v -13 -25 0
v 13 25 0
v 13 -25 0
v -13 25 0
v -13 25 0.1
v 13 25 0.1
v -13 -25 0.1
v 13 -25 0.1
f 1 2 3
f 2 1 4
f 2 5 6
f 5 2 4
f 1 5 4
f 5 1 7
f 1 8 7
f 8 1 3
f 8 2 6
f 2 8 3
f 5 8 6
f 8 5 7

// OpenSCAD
// file: ../p/4-4edge.scad
use <../lib.scad>
$fa=1; $fs=0.2;
function ldraw_lib__4_4edge(realsolid=false) = [
// 0 Circle 1.0
// 0 Name: 4-4edge.dat
// 0 Author: James Jessiman
// 0 !LDRAW_ORG Primitive UPDATE 2017-01
// 0 !LICENSE Licensed under CC BY 2.0 and CC BY 4.0 : see CAreadme.txt
// 
// 0 BFC CERTIFY CCW
  [0,"BFC","CERTIFY"],
  [0,"BFC","CCW"],
// 
// 0 !HISTORY 1998-12-15 [PTadmin] Official Update 1998-10
// 0 !HISTORY 2005-12-28 [PTadmin] Official Update 2005-01
// 0 !HISTORY 2007-06-24 [PTadmin] Header formatted for Contributor Agreement
// 0 !HISTORY 2008-07-01 [PTadmin] Official Update 2008-01
// 0 !HISTORY 2017-01-15 [Steffen] BFCed
// 0 !HISTORY 2017-12-30 [PTadmin] Official Update 2017-01
// 
// 
// 2 24 1 0 0 0.9239 0 0.3827
  [2,24,1,0,0,0.9239,0,0.3827],
// 2 24 0.9239 0 0.3827 0.7071 0 0.7071
  [2,24,0.9239,0,0.3827,0.7071,0,0.7071],
// 2 24 0.7071 0 0.7071 0.3827 0 0.9239
  [2,24,0.7071,0,0.7071,0.3827,0,0.9239],
// 2 24 0.3827 0 0.9239 0 0 1
  [2,24,0.3827,0,0.9239,0,0,1],
// 2 24 0 0 1 -0.3827 0 0.9239
  [2,24,0,0,1,-0.3827,0,0.9239],
// 2 24 -0.3827 0 0.9239 -0.7071 0 0.7071
  [2,24,-0.3827,0,0.9239,-0.7071,0,0.7071],
// 2 24 -0.7071 0 0.7071 -0.9239 0 0.3827
  [2,24,-0.7071,0,0.7071,-0.9239,0,0.3827],
// 2 24 -0.9239 0 0.3827 -1 0 -0
  [2,24,-0.9239,0,0.3827,-1,0,-0],
// 2 24 -1 0 -0 -0.9239 0 -0.3827
  [2,24,-1,0,-0,-0.9239,0,-0.3827],
// 2 24 -0.9239 0 -0.3827 -0.7071 0 -0.7071
  [2,24,-0.9239,0,-0.3827,-0.7071,0,-0.7071],
// 2 24 -0.7071 0 -0.7071 -0.3827 0 -0.9239
  [2,24,-0.7071,0,-0.7071,-0.3827,0,-0.9239],
// 2 24 -0.3827 0 -0.9239 0 0 -1
  [2,24,-0.3827,0,-0.9239,0,0,-1],
// 2 24 0 0 -1 0.3827 0 -0.9239
  [2,24,0,0,-1,0.3827,0,-0.9239],
// 2 24 0.3827 0 -0.9239 0.7071 0 -0.7071
  [2,24,0.3827,0,-0.9239,0.7071,0,-0.7071],
// 2 24 0.7071 0 -0.7071 0.9239 0 -0.3827
  [2,24,0.7071,0,-0.7071,0.9239,0,-0.3827],
// 2 24 0.9239 0 -0.3827 1 0 0
  [2,24,0.9239,0,-0.3827,1,0,0],
];
module ldraw_lib__4_4edge(step=0, col=false, unit=2/5, alt=false, line=0.2, solid=!$preview)
    makepoly(ldraw_lib__4_4edge(solid), step=step, col=col, unit=unit, alt=alt, line=line, solid=solid);
ldraw_lib__4_4edge(line=0.2);
// file: ../p/4-4disc.scad
use <../lib.scad>
$fa=1; $fs=0.2;
function ldraw_lib__4_4disc(realsolid=false) = [
// 0 Disc 1.0
// 0 Name: 4-4disc.dat
// 0 Author: James Jessiman
// 0 !LDRAW_ORG Primitive UPDATE 2002-02
// 0 !LICENSE Licensed under CC BY 2.0 and CC BY 4.0 : see CAreadme.txt
// 
// 0 BFC CERTIFY CCW
  [0,"BFC","CERTIFY"],
  [0,"BFC","CCW"],
// 
// 0 !HISTORY 1998-12-15 [PTadmin] Official Update 1998-10
// 0 !HISTORY 2002-03-23 [sbliss] Added BFC statement
// 0 !HISTORY 2002-04-25 [PTadmin] Official Update 2002-02
// 0 !HISTORY 2007-06-24 [PTadmin] Header formatted for Contributor Agreement
// 0 !HISTORY 2008-07-01 [PTadmin] Official Update 2008-01
// 
// 
// 3 16 0 0 0 1 0 0 0.9239 0 0.3827
  [3,16,0,0,0,1,0,0,0.9239,0,0.3827],
// 3 16 0 0 0 0.9239 0 0.3827 0.7071 0 0.7071
  [3,16,0,0,0,0.9239,0,0.3827,0.7071,0,0.7071],
// 3 16 0 0 0 0.7071 0 0.7071 0.3827 0 0.9239
  [3,16,0,0,0,0.7071,0,0.7071,0.3827,0,0.9239],
// 3 16 0 0 0 0.3827 0 0.9239 0 0 1
  [3,16,0,0,0,0.3827,0,0.9239,0,0,1],
// 3 16 0 0 0 0 0 1 -0.3827 0 0.9239
  [3,16,0,0,0,0,0,1,-0.3827,0,0.9239],
// 3 16 0 0 0 -0.3827 0 0.9239 -0.7071 0 0.7071
  [3,16,0,0,0,-0.3827,0,0.9239,-0.7071,0,0.7071],
// 3 16 0 0 0 -0.7071 0 0.7071 -0.9239 0 0.3827
  [3,16,0,0,0,-0.7071,0,0.7071,-0.9239,0,0.3827],
// 3 16 0 0 0 -0.9239 0 0.3827 -1 0 -0
  [3,16,0,0,0,-0.9239,0,0.3827,-1,0,-0],
// 3 16 0 0 0 -1 0 -0 -0.9239 0 -0.3827
  [3,16,0,0,0,-1,0,-0,-0.9239,0,-0.3827],
// 3 16 0 0 0 -0.9239 0 -0.3827 -0.7071 0 -0.7071
  [3,16,0,0,0,-0.9239,0,-0.3827,-0.7071,0,-0.7071],
// 3 16 0 0 0 -0.7071 0 -0.7071 -0.3827 0 -0.9239
  [3,16,0,0,0,-0.7071,0,-0.7071,-0.3827,0,-0.9239],
// 3 16 0 0 0 -0.3827 0 -0.9239 0 0 -1
  [3,16,0,0,0,-0.3827,0,-0.9239,0,0,-1],
// 3 16 0 0 0 0 0 -1 0.3827 0 -0.9239
  [3,16,0,0,0,0,0,-1,0.3827,0,-0.9239],
// 3 16 0 0 0 0.3827 0 -0.9239 0.7071 0 -0.7071
  [3,16,0,0,0,0.3827,0,-0.9239,0.7071,0,-0.7071],
// 3 16 0 0 0 0.7071 0 -0.7071 0.9239 0 -0.3827
  [3,16,0,0,0,0.7071,0,-0.7071,0.9239,0,-0.3827],
// 3 16 0 0 0 0.9239 0 -0.3827 1 0 0
  [3,16,0,0,0,0.9239,0,-0.3827,1,0,0],
// 0
];
module ldraw_lib__4_4disc(step=0, col=false, unit=2/5, alt=false, line=0.2, solid=!$preview)
    makepoly(ldraw_lib__4_4disc(solid), step=step, col=col, unit=unit, alt=alt, line=line, solid=solid);
ldraw_lib__4_4disc(line=0.2);
// file: ../p/4-4cyli.scad
use <../lib.scad>
$fa=1; $fs=0.2;
function ldraw_lib__4_4cyli(realsolid=false) = [
// 0 Cylinder 1.0
// 0 Name: 4-4cyli.dat
// 0 Author: James Jessiman
// 0 !LDRAW_ORG Primitive UPDATE 2005-01
// 0 !LICENSE Licensed under CC BY 2.0 and CC BY 4.0 : see CAreadme.txt
// 
// 0 BFC CERTIFY CCW
  [0,"BFC","CERTIFY"],
  [0,"BFC","CCW"],
// 
// 0 !HISTORY 1998-12-15 [PTadmin] Official Update 1998-10
// 0 !HISTORY 2002-03-23 [sbliss] Added BFC statement; merged headers from files in distributions LDraw 0.27 and Complete.
// 0 !HISTORY 2002-04-25 [PTadmin] Official Update 2002-02
// 0 !HISTORY 2004-12-14 [guyvivan] BFC CCW
// 0 !HISTORY 2005-12-28 [PTadmin] Official Update 2005-01
// 0 !HISTORY 2007-06-24 [PTadmin] Header formatted for Contributor Agreement
// 0 !HISTORY 2008-07-01 [PTadmin] Official Update 2008-01
// 
// 
// 4 16 1 1 0 0.9239 1 0.3827 0.9239 0 0.3827 1 0 0
  [4,16,1,1,0,0.9239,1,0.3827,0.9239,0,0.3827,1,0,0],
// 5 24 1 0 0 1 1 0 0.9239 0 0.3827 0.9239 0 -0.3827
  [5,24,1,0,0,1,1,0,0.9239,0,0.3827,0.9239,0,-0.3827],
// 4 16 0.9239 1 0.3827 0.7071 1 0.7071 0.7071 0 0.7071 0.9239 0 0.3827
  [4,16,0.9239,1,0.3827,0.7071,1,0.7071,0.7071,0,0.7071,0.9239,0,0.3827],
// 5 24 0.9239 0 0.3827 0.9239 1 0.3827 0.7071 0 0.7071 1 0 0
  [5,24,0.9239,0,0.3827,0.9239,1,0.3827,0.7071,0,0.7071,1,0,0],
// 4 16 0.7071 1 0.7071 0.3827 1 0.9239 0.3827 0 0.9239 0.7071 0 0.7071
  [4,16,0.7071,1,0.7071,0.3827,1,0.9239,0.3827,0,0.9239,0.7071,0,0.7071],
// 5 24 0.7071 0 0.7071 0.7071 1 0.7071 0.3827 0 0.9239 0.9239 0 0.3827
  [5,24,0.7071,0,0.7071,0.7071,1,0.7071,0.3827,0,0.9239,0.9239,0,0.3827],
// 4 16 0.3827 1 0.9239 0 1 1 0 0 1 0.3827 0 0.9239
  [4,16,0.3827,1,0.9239,0,1,1,0,0,1,0.3827,0,0.9239],
// 5 24 0.3827 0 0.9239 0.3827 1 0.9239 0 0 1 0.7071 0 0.7071
  [5,24,0.3827,0,0.9239,0.3827,1,0.9239,0,0,1,0.7071,0,0.7071],
// 4 16 0 1 1 -0.3827 1 0.9239 -0.3827 0 0.9239 0 0 1
  [4,16,0,1,1,-0.3827,1,0.9239,-0.3827,0,0.9239,0,0,1],
// 5 24 0 0 1 0 1 1 -0.3827 0 0.9239 0.3827 0 0.9239
  [5,24,0,0,1,0,1,1,-0.3827,0,0.9239,0.3827,0,0.9239],
// 4 16 -0.3827 1 0.9239 -0.7071 1 0.7071 -0.7071 0 0.7071 -0.3827 0 0.9239
  [4,16,-0.3827,1,0.9239,-0.7071,1,0.7071,-0.7071,0,0.7071,-0.3827,0,0.9239],
// 5 24 -0.3827 0 0.9239 -0.3827 1 0.9239 -0.7071 0 0.7071 0 0 1
  [5,24,-0.3827,0,0.9239,-0.3827,1,0.9239,-0.7071,0,0.7071,0,0,1],
// 4 16 -0.7071 1 0.7071 -0.9239 1 0.3827 -0.9239 0 0.3827 -0.7071 0 0.7071
  [4,16,-0.7071,1,0.7071,-0.9239,1,0.3827,-0.9239,0,0.3827,-0.7071,0,0.7071],
// 5 24 -0.7071 0 0.7071 -0.7071 1 0.7071 -0.9239 0 0.3827 -0.3827 0 0.9239
  [5,24,-0.7071,0,0.7071,-0.7071,1,0.7071,-0.9239,0,0.3827,-0.3827,0,0.9239],
// 4 16 -0.9239 1 0.3827 -1 1 0 -1 0 0 -0.9239 0 0.3827
  [4,16,-0.9239,1,0.3827,-1,1,0,-1,0,0,-0.9239,0,0.3827],
// 5 24 -0.9239 0 0.3827 -0.9239 1 0.3827 -1 0 0 -0.7071 0 0.7071
  [5,24,-0.9239,0,0.3827,-0.9239,1,0.3827,-1,0,0,-0.7071,0,0.7071],
// 4 16 -1 1 0 -0.9239 1 -0.3827 -0.9239 0 -0.3827 -1 0 0
  [4,16,-1,1,0,-0.9239,1,-0.3827,-0.9239,0,-0.3827,-1,0,0],
// 5 24 -1 0 0 -1 1 0 -0.9239 0 -0.3827 -0.9239 0 0.3827
  [5,24,-1,0,0,-1,1,0,-0.9239,0,-0.3827,-0.9239,0,0.3827],
// 4 16 -0.9239 1 -0.3827 -0.7071 1 -0.7071 -0.7071 0 -0.7071 -0.9239 0 -0.3827
  [4,16,-0.9239,1,-0.3827,-0.7071,1,-0.7071,-0.7071,0,-0.7071,-0.9239,0,-0.3827],
// 5 24 -0.9239 0 -0.3827 -0.9239 1 -0.3827 -0.7071 0 -0.7071 -1 0 0
  [5,24,-0.9239,0,-0.3827,-0.9239,1,-0.3827,-0.7071,0,-0.7071,-1,0,0],
// 4 16 -0.7071 1 -0.7071 -0.3827 1 -0.9239 -0.3827 0 -0.9239 -0.7071 0 -0.7071
  [4,16,-0.7071,1,-0.7071,-0.3827,1,-0.9239,-0.3827,0,-0.9239,-0.7071,0,-0.7071],
// 5 24 -0.7071 0 -0.7071 -0.7071 1 -0.7071 -0.3827 0 -0.9239 -0.9239 0 -0.3827
  [5,24,-0.7071,0,-0.7071,-0.7071,1,-0.7071,-0.3827,0,-0.9239,-0.9239,0,-0.3827],
// 4 16 -0.3827 1 -0.9239 0 1 -1 0 0 -1 -0.3827 0 -0.9239
  [4,16,-0.3827,1,-0.9239,0,1,-1,0,0,-1,-0.3827,0,-0.9239],
// 5 24 -0.3827 0 -0.9239 -0.3827 1 -0.9239 0 0 -1 -0.7071 0 -0.7071
  [5,24,-0.3827,0,-0.9239,-0.3827,1,-0.9239,0,0,-1,-0.7071,0,-0.7071],
// 4 16 0 1 -1 0.3827 1 -0.9239 0.3827 0 -0.9239 0 0 -1
  [4,16,0,1,-1,0.3827,1,-0.9239,0.3827,0,-0.9239,0,0,-1],
// 5 24 0 0 -1 0 1 -1 0.3827 0 -0.9239 -0.3827 0 -0.9239
  [5,24,0,0,-1,0,1,-1,0.3827,0,-0.9239,-0.3827,0,-0.9239],
// 4 16 0.3827 1 -0.9239 0.7071 1 -0.7071 0.7071 0 -0.7071 0.3827 0 -0.9239
  [4,16,0.3827,1,-0.9239,0.7071,1,-0.7071,0.7071,0,-0.7071,0.3827,0,-0.9239],
// 5 24 0.3827 0 -0.9239 0.3827 1 -0.9239 0.7071 0 -0.7071 0 0 -1
  [5,24,0.3827,0,-0.9239,0.3827,1,-0.9239,0.7071,0,-0.7071,0,0,-1],
// 4 16 0.7071 1 -0.7071 0.9239 1 -0.3827 0.9239 0 -0.3827 0.7071 0 -0.7071
  [4,16,0.7071,1,-0.7071,0.9239,1,-0.3827,0.9239,0,-0.3827,0.7071,0,-0.7071],
// 5 24 0.7071 0 -0.7071 0.7071 1 -0.7071 0.9239 0 -0.3827 0.3827 0 -0.9239
  [5,24,0.7071,0,-0.7071,0.7071,1,-0.7071,0.9239,0,-0.3827,0.3827,0,-0.9239],
// 4 16 0.9239 1 -0.3827 1 1 0 1 0 0 0.9239 0 -0.3827
  [4,16,0.9239,1,-0.3827,1,1,0,1,0,0,0.9239,0,-0.3827],
// 5 24 0.9239 0 -0.3827 0.9239 1 -0.3827 1 0 0 0.7071 0 -0.7071
  [5,24,0.9239,0,-0.3827,0.9239,1,-0.3827,1,0,0,0.7071,0,-0.7071],
// 0
];
module ldraw_lib__4_4cyli(step=0, col=false, unit=2/5, alt=false, line=0.2, solid=!$preview)
    makepoly(ldraw_lib__4_4cyli(solid), step=step, col=col, unit=unit, alt=alt, line=line, solid=solid);
ldraw_lib__4_4cyli(line=0.2);
// file: ../p/stud3.scad
use <../lib.scad>
use <4-4cyli.scad>
use <4-4disc.scad>
use <4-4edge.scad>
$fa=1; $fs=0.2;
function ldraw_lib__stud3(realsolid=false) = realsolid ? 
    [openscad(translate([0,0,-eps()], o=cylinder(4+eps(), r=4)),2)] : [
// 0 Stud Tube Solid
// 0 Name: stud3.dat
// 0 Author: James Jessiman
// 0 !LDRAW_ORG Primitive UPDATE 2012-01
// 0 !LICENSE Licensed under CC BY 2.0 and CC BY 4.0 : see CAreadme.txt
// 
// 0 BFC CERTIFY CCW
  [0,"BFC","CERTIFY"],
  [0,"BFC","CCW"],
// 
// 0 !HISTORY 2002-04-04 [sbliss] Modified for BFC compliance
// 0 !HISTORY 2002-04-25 [PTadmin] Official Update 2002-02
// 0 !HISTORY 2007-06-24 [PTadmin] Header formatted for Contributor Agreement
// 0 !HISTORY 2008-07-01 [PTadmin] Official Update 2008-01
// 0 !HISTORY 2012-02-16 [Philo] Changed to CCW
// 0 !HISTORY 2012-03-30 [PTadmin] Official Update 2012-01
// 
// 
// 1 16 0 -4 0 4 0 0 0 1 0 0 0 4 4-4edge.dat
  [1,16,0,-4,0,4,0,0,0,1,0,0,0,4, ldraw_lib__4_4edge(realsolid)],
// 1 16 0 0 0 4 0 0 0 1 0 0 0 4 4-4edge.dat
  [1,16,0,0,0,4,0,0,0,1,0,0,0,4, ldraw_lib__4_4edge(realsolid)],
// 1 16 0 -4 0 4 0 0 0 1 0 0 0 4 4-4disc.dat
  [1,16,0,-4,0,4,0,0,0,1,0,0,0,4, ldraw_lib__4_4disc(realsolid)],
// 1 16 0 -4 0 4 0 0 0 4 0 0 0 4 4-4cyli.dat
  [1,16,0,-4,0,4,0,0,0,4,0,0,0,4, ldraw_lib__4_4cyli(realsolid)],
];
module ldraw_lib__stud3(step=0, col=false, unit=2/5, alt=false, line=0.2, solid=!$preview)
    makepoly(ldraw_lib__stud3(solid), step=step, col=col, unit=unit, alt=alt, line=line, solid=solid);
ldraw_lib__stud3(line=0.2);
// file: ../p/stud.scad
use <../lib.scad>
use <4-4cyli.scad>
use <4-4disc.scad>
use <4-4edge.scad>
$fa=1; $fs=0.2;
function ldraw_lib__stud(realsolid=false) = realsolid ? 
    [openscad(translate([0,0,-eps()], o=cylinder(4+eps(), r=6)),2)] : [
// 0 Stud
// 0 Name: stud.dat
// 0 Author: James Jessiman
// 0 !LDRAW_ORG Primitive UPDATE 2012-01
// 0 !LICENSE Licensed under CC BY 2.0 and CC BY 4.0 : see CAreadme.txt
// 
// 0 BFC CERTIFY CCW
  [0,"BFC","CERTIFY"],
  [0,"BFC","CCW"],
// 
// 0 !HISTORY 2002-04-04 [sbliss] Modified for BFC compliance
// 0 !HISTORY 2002-04-25 [PTadmin] Official Update 2002-02
// 0 !HISTORY 2007-06-24 [PTadmin] Header formatted for Contributor Agreement
// 0 !HISTORY 2008-07-01 [PTadmin] Official Update 2008-01
// 0 !HISTORY 2012-02-16 [Philo] Changed to CCW
// 0 !HISTORY 2012-03-30 [PTadmin] Official Update 2012-01
// 
// 
// 1 16 0 0 0 6 0 0 0 1 0 0 0 6 4-4edge.dat
  [1,16,0,0,0,6,0,0,0,1,0,0,0,6, ldraw_lib__4_4edge(realsolid)],
// 1 16 0 -4 0 6 0 0 0 1 0 0 0 6 4-4edge.dat
  [1,16,0,-4,0,6,0,0,0,1,0,0,0,6, ldraw_lib__4_4edge(realsolid)],
// 1 16 0 0 0 6 0 0 0 -4 0 0 0 6 4-4cyli.dat
  [1,16,0,0,0,6,0,0,0,-4,0,0,0,6, ldraw_lib__4_4cyli(realsolid)],
// 1 16 0 -4 0 6 0 0 0 1 0 0 0 6 4-4disc.dat
  [1,16,0,-4,0,6,0,0,0,1,0,0,0,6, ldraw_lib__4_4disc(realsolid)],
];
module ldraw_lib__stud(step=0, col=false, unit=2/5, alt=false, line=0.2, solid=!$preview)
    makepoly(ldraw_lib__stud(solid), step=step, col=col, unit=unit, alt=alt, line=line, solid=solid);
ldraw_lib__stud(line=0.2);
// file: ../p/box5.scad
use <../lib.scad>
$fa=1; $fs=0.2;
function ldraw_lib__box5(realsolid=false) = [
// 0 Box with 5 Faces and All Edges
// 0 Name: box5.dat
// 0 Author: James Jessiman
// 0 !LDRAW_ORG Primitive UPDATE 2012-01
// 0 !LICENSE Licensed under CC BY 2.0 and CC BY 4.0 : see CAreadme.txt
// 
// 0 BFC CERTIFY CCW
  [0,"BFC","CERTIFY"],
  [0,"BFC","CCW"],
// 
// 0 !HISTORY 2002-04-03 [sbliss] Modified for BFC compliance
// 0 !HISTORY 2002-04-25 [PTadmin] Official Update 2002-02
// 0 !HISTORY 2007-06-24 [PTadmin] Header formatted for Contributor Agreement
// 0 !HISTORY 2008-07-01 [PTadmin] Official Update 2008-01
// 0 !HISTORY 2012-02-16 [Philo] Changed to CCW
// 0 !HISTORY 2012-03-30 [PTadmin] Official Update 2012-01
// 
// 
// 2 24 1 1 1 -1 1 1
  [2,24,1,1,1,-1,1,1],
// 2 24 -1 1 1 -1 1 -1
  [2,24,-1,1,1,-1,1,-1],
// 2 24 -1 1 -1 1 1 -1
  [2,24,-1,1,-1,1,1,-1],
// 2 24 1 1 -1 1 1 1
  [2,24,1,1,-1,1,1,1],
// 2 24 1 0 1 -1 0 1
  [2,24,1,0,1,-1,0,1],
// 2 24 -1 0 1 -1 0 -1
  [2,24,-1,0,1,-1,0,-1],
// 2 24 -1 0 -1 1 0 -1
  [2,24,-1,0,-1,1,0,-1],
// 2 24 1 0 -1 1 0 1
  [2,24,1,0,-1,1,0,1],
// 2 24 1 0 1 1 1 1
  [2,24,1,0,1,1,1,1],
// 2 24 -1 0 1 -1 1 1
  [2,24,-1,0,1,-1,1,1],
// 2 24 1 0 -1 1 1 -1
  [2,24,1,0,-1,1,1,-1],
// 2 24 -1 0 -1 -1 1 -1
  [2,24,-1,0,-1,-1,1,-1],
// 4 16 -1 1 1 1 1 1 1 1 -1 -1 1 -1
  [4,16,-1,1,1,1,1,1,1,1,-1,-1,1,-1],
// 4 16 -1 1 1 -1 0 1 1 0 1 1 1 1
  [4,16,-1,1,1,-1,0,1,1,0,1,1,1,1],
// 4 16 -1 1 -1 -1 0 -1 -1 0 1 -1 1 1
  [4,16,-1,1,-1,-1,0,-1,-1,0,1,-1,1,1],
// 4 16 1 1 -1 1 0 -1 -1 0 -1 -1 1 -1
  [4,16,1,1,-1,1,0,-1,-1,0,-1,-1,1,-1],
// 4 16 1 1 1 1 0 1 1 0 -1 1 1 -1
  [4,16,1,1,1,1,0,1,1,0,-1,1,1,-1],
];
module ldraw_lib__box5(step=0, col=false, unit=2/5, alt=false, line=0.2, solid=!$preview)
    makepoly(ldraw_lib__box5(solid), step=step, col=col, unit=unit, alt=alt, line=line, solid=solid);
ldraw_lib__box5(line=0.2);
// file: ../p/box4t.scad
use <../lib.scad>
$fa=1; $fs=0.2;
function ldraw_lib__box4t(realsolid=false) = [
// 0 Box with 4 Adjacent Faces and All Edges
// 0 Name: box4t.dat
// 0 Author: Tore Eriksson [Tore_Eriksson]
// 0 !LDRAW_ORG Primitive UPDATE 2003-02
// 0 !LICENSE Licensed under CC BY 2.0 and CC BY 4.0 : see CAreadme.txt
// 
// 0 BFC CERTIFY CCW
  [0,"BFC","CERTIFY"],
  [0,"BFC","CCW"],
// 
// 0 !HISTORY 1997-09-29 [PTadmin] Official Update 1997-15
// 0 !HISTORY 2002-08-31 [izanette] Modified with WINDZ for BFC compliance
// 0 !HISTORY 2003-08-01 [PTadmin] Official Update 2003-02
// 0 !HISTORY 2007-06-24 [PTadmin] Header formatted for Contributor Agreement
// 0 !HISTORY 2008-07-01 [PTadmin] Official Update 2008-01
// 
// 
// 2 24 1 1 1 -1 1 1
  [2,24,1,1,1,-1,1,1],
// 2 24 -1 1 1 -1 1 -1
  [2,24,-1,1,1,-1,1,-1],
// 2 24 -1 1 -1 1 1 -1
  [2,24,-1,1,-1,1,1,-1],
// 2 24 1 1 -1 1 1 1
  [2,24,1,1,-1,1,1,1],
// 2 24 1 0 1 -1 0 1
  [2,24,1,0,1,-1,0,1],
// 2 24 -1 0 1 -1 0 -1
  [2,24,-1,0,1,-1,0,-1],
// 2 24 -1 0 -1 1 0 -1
  [2,24,-1,0,-1,1,0,-1],
// 2 24 1 0 -1 1 0 1
  [2,24,1,0,-1,1,0,1],
// 2 24 1 0 1 1 1 1
  [2,24,1,0,1,1,1,1],
// 2 24 -1 0 1 -1 1 1
  [2,24,-1,0,1,-1,1,1],
// 2 24 1 0 -1 1 1 -1
  [2,24,1,0,-1,1,1,-1],
// 2 24 -1 0 -1 -1 1 -1
  [2,24,-1,0,-1,-1,1,-1],
// 4 16 1 1 1 1 1 -1 -1 1 -1 -1 1 1
  [4,16,1,1,1,1,1,-1,-1,1,-1,-1,1,1],
// 4 16 1 1 1 -1 1 1 -1 0 1 1 0 1
  [4,16,1,1,1,-1,1,1,-1,0,1,1,0,1],
// 4 16 -1 1 1 -1 1 -1 -1 0 -1 -1 0 1
  [4,16,-1,1,1,-1,1,-1,-1,0,-1,-1,0,1],
// 0 4 16 -1 1 -1 -1 0 -1 1 0 -1 1 1 -1
// 4 16 1 1 -1 1 1 1 1 0 1 1 0 -1
  [4,16,1,1,-1,1,1,1,1,0,1,1,0,-1],
// 0
];
module ldraw_lib__box4t(step=0, col=false, unit=2/5, alt=false, line=0.2, solid=!$preview)
    makepoly(ldraw_lib__box4t(solid), step=step, col=col, unit=unit, alt=alt, line=line, solid=solid);
ldraw_lib__box4t(line=0.2);
// file: s/3004s01.scad
use <../../lib.scad>
use <../../p/box4t.scad>
use <../../p/box5.scad>
use <../../p/stud.scad>
use <../../p/stud3.scad>
$fa=1; $fs=0.2;
function ldraw_lib__s__3004s01(realsolid=false) = [
// 0 ~Brick  1 x  2 without Front Face
// 0 Name: s\3004s01.dat
// 0 Author: James Jessiman
// 0 !LDRAW_ORG Subpart UPDATE 2003-03
// 0 !LICENSE Licensed under CC BY 2.0 and CC BY 4.0 : see CAreadme.txt
// 
// 0 BFC CERTIFY CCW
  [0,"BFC","CERTIFY"],
  [0,"BFC","CCW"],
// 
// 0 !HISTORY 2003-09-07 [jriley] Subfiling, BFC
// 0 !HISTORY 2003-12-19 [PTadmin] Official Update 2003-03
// 0 !HISTORY 2007-08-29 [PTadmin] Header formatted for Contributor Agreement
// 0 !HISTORY 2008-07-01 [PTadmin] Official Update 2008-01
// 
// 
// 1 16 0 4 0 1 0 0 0 -5 0 0 0 1 stud3.dat
  [1,16,0,4,0,1,0,0,0,-5,0,0,0,1, ldraw_lib__stud3(realsolid)],
// 0 BFC INVERTNEXT
  [0,"BFC","INVERTNEXT"],
// 1 16 0 24 0 16 0 0 0 -20 0 0 0 6 box5.dat
  [1,16,0,24,0,16,0,0,0,-20,0,0,0,6, ldraw_lib__box5(realsolid)],
// 4 16 20 24 10 16 24 6 -16 24 6 -20 24 10
  [4,16,20,24,10,16,24,6,-16,24,6,-20,24,10],
// 4 16 -20 24 10 -16 24 6 -16 24 -6 -20 24 -10
  [4,16,-20,24,10,-16,24,6,-16,24,-6,-20,24,-10],
// 4 16 -20 24 -10 -16 24 -6 16 24 -6 20 24 -10
  [4,16,-20,24,-10,-16,24,-6,16,24,-6,20,24,-10],
// 4 16 20 24 -10 16 24 -6 16 24 6 20 24 10
  [4,16,20,24,-10,16,24,-6,16,24,6,20,24,10],
// 1 16 0 24 0 20 0 0 0 -24 0 0 0 10 box4t.dat
  [1,16,0,24,0,20,0,0,0,-24,0,0,0,10, ldraw_lib__box4t(realsolid)],
// 1 16 10 0 0 1 0 0 0 1 0 0 0 1 stud.dat
  [1,16,10,0,0,1,0,0,0,1,0,0,0,1, ldraw_lib__stud(realsolid)],
// 1 16 -10 0 0 1 0 0 0 1 0 0 0 1 stud.dat
  [1,16,-10,0,0,1,0,0,0,1,0,0,0,1, ldraw_lib__stud(realsolid)],
// 0
];
module ldraw_lib__s__3004s01(step=0, col=false, unit=2/5, alt=false, line=0.2, solid=!$preview)
    makepoly(ldraw_lib__s__3004s01(solid), step=step, col=col, unit=unit, alt=alt, line=line, solid=solid);
ldraw_lib__s__3004s01(line=0.2);
// file: 3004.scad
use <../lib.scad>
use <s/3004s01.scad>
$fa=1; $fs=0.2;
function ldraw_lib__3004(realsolid=false) = [
// 0 Brick  1 x  2
// 0 Name: 3004.dat
// 0 Author: James Jessiman
// 0 !LDRAW_ORG Part UPDATE 2022-05
// 0 !LICENSE Licensed under CC BY 2.0 and CC BY 4.0 : see CAreadme.txt
// 
// 0 BFC CERTIFY CCW
  [0,"BFC","CERTIFY"],
  [0,"BFC","CCW"],
// 
// 0 !HISTORY 2001-10-26 [PTadmin] Official Update 2001-01
// 0 !HISTORY 2002-05-07 {unknown} BFC Certification
// 0 !HISTORY 2002-06-11 [PTadmin] Official Update 2002-03
// 0 !HISTORY 2007-05-07 [PTadmin] Header formatted for Contributor Agreement
// 0 !HISTORY 2008-07-01 [PTadmin] Official Update 2008-01
// 0 !HISTORY 2022-08-04 [MagFors] Using subfile
// 0 !HISTORY 2022-09-15 [PTadmin] Official Update 2022-05
// 
// 
// 1 16 0 0 0 1 0 0 0 1 0 0 0 1 s\3004s01.dat
  [1,16,0,0,0,1,0,0,0,1,0,0,0,1, ldraw_lib__s__3004s01(realsolid)],
// 4 16 -20 24 -10 20 24 -10 20 0 -10 -20 0 -10
  [4,16,-20,24,-10,20,24,-10,20,0,-10,-20,0,-10],
];
module ldraw_lib__3004(step=0, col=false, unit=2/5, alt=false, line=0.2, solid=!$preview)
    makepoly(ldraw_lib__3004(solid), step=step, col=col, unit=unit, alt=alt, line=line, solid=solid);
ldraw_lib__3004(line=0.2);
// file: ../p/box5-12.scad
use <../lib.scad>
$fa=1; $fs=0.2;
function ldraw_lib__box5_12(realsolid=false) = [
// 0 Box with 5 Faces without Any Edges
// 0 Name: box5-12.dat
// 0 Author: Chris Dee [cwdee]
// 0 !LDRAW_ORG Primitive UPDATE 2009-02
// 0 !LICENSE Licensed under CC BY 2.0 and CC BY 4.0 : see CAreadme.txt
// 
// 0 BFC CERTIFY CCW
  [0,"BFC","CERTIFY"],
  [0,"BFC","CCW"],
// 
// 0 !HISTORY 2009-09-03 [PTadmin] Official Update 2009-02
// 
// 
// 4 16 1 1 1 1 1 -1 -1 1 -1 -1 1 1
  [4,16,1,1,1,1,1,-1,-1,1,-1,-1,1,1],
// 4 16 -1 0 1 1 0 1 1 1 1 -1 1 1
  [4,16,-1,0,1,1,0,1,1,1,1,-1,1,1],
// 4 16 -1 0 -1 -1 0 1 -1 1 1 -1 1 -1
  [4,16,-1,0,-1,-1,0,1,-1,1,1,-1,1,-1],
// 4 16 1 0 -1 -1 0 -1 -1 1 -1 1 1 -1
  [4,16,1,0,-1,-1,0,-1,-1,1,-1,1,1,-1],
// 4 16 1 0 1 1 0 -1 1 1 -1 1 1 1
  [4,16,1,0,1,1,0,-1,1,1,-1,1,1,1],
// 0
];
module ldraw_lib__box5_12(step=0, col=false, unit=2/5, alt=false, line=0.2, solid=!$preview)
    makepoly(ldraw_lib__box5_12(solid), step=step, col=col, unit=unit, alt=alt, line=line, solid=solid);
ldraw_lib__box5_12(line=0.2);
// main file
use <../lib.scad>
use <../p/box5-12.scad>
$fa=1; $fs=0.2;
function ldraw_lib__6022692b(realsolid=false) = [
// 0 Sticker  6.3 x  3.3 with Mystery of the Monorail Movie Poster
// 0 Name: 6022692b.dat
// 0 Author: Orion Pobursky [OrionP]
// 0 !LDRAW_ORG Part UPDATE 2022-02
// 0 !LICENSE Licensed under CC BY 2.0 and CC BY 4.0 : see CAreadme.txt
// 
// 0 BFC CERTIFY CCW
  [0,"BFC","CERTIFY"],
  [0,"BFC","CCW"],
// 
// 0 !KEYWORDS set 10232
// 
// 0 !HISTORY 2022-03-06 [PTadmin] Official Update 2022-02
// 
// 
// 1 16 0 -0.25 0 32.5 0 0 0 0.25 0 0 0 62.5 box5-12.dat
  [1,16,0,-0.25,0,32.5,0,0,0,0.25,0,0,0,62.5, ldraw_lib__box5_12(realsolid)],
// 
// 0 !TEXMAP START PLANAR -32.5 -0.25 62.5 32.5 -0.25 62.5 -32.5 -0.25 -62.5 6022692b.png
// 0 !: 4 15 -32.5 -0.25 62.5 -32.5 -0.25 -62.5 32.5 -0.25 -62.5 32.5 -0.25 62.5
// 0 !TEXMAP FALLBACK
// 4 15 -32.5 -0.25 62.5 -32.5 -0.25 -62.5 32.5 -0.25 -62.5 32.5 -0.25 62.5
  [4,15,-32.5,-0.25,62.5,-32.5,-0.25,-62.5,32.5,-0.25,-62.5,32.5,-0.25,62.5],
// 0 !TEXMAP END
];
module ldraw_lib__6022692b(step=0, col=false, unit=2/5, alt=false, line=0.2, solid=!$preview)
    makepoly(ldraw_lib__6022692b(solid), step=step, col=col, unit=unit, alt=alt, line=line, solid=solid);
ldraw_lib__6022692b(line=0.2);
